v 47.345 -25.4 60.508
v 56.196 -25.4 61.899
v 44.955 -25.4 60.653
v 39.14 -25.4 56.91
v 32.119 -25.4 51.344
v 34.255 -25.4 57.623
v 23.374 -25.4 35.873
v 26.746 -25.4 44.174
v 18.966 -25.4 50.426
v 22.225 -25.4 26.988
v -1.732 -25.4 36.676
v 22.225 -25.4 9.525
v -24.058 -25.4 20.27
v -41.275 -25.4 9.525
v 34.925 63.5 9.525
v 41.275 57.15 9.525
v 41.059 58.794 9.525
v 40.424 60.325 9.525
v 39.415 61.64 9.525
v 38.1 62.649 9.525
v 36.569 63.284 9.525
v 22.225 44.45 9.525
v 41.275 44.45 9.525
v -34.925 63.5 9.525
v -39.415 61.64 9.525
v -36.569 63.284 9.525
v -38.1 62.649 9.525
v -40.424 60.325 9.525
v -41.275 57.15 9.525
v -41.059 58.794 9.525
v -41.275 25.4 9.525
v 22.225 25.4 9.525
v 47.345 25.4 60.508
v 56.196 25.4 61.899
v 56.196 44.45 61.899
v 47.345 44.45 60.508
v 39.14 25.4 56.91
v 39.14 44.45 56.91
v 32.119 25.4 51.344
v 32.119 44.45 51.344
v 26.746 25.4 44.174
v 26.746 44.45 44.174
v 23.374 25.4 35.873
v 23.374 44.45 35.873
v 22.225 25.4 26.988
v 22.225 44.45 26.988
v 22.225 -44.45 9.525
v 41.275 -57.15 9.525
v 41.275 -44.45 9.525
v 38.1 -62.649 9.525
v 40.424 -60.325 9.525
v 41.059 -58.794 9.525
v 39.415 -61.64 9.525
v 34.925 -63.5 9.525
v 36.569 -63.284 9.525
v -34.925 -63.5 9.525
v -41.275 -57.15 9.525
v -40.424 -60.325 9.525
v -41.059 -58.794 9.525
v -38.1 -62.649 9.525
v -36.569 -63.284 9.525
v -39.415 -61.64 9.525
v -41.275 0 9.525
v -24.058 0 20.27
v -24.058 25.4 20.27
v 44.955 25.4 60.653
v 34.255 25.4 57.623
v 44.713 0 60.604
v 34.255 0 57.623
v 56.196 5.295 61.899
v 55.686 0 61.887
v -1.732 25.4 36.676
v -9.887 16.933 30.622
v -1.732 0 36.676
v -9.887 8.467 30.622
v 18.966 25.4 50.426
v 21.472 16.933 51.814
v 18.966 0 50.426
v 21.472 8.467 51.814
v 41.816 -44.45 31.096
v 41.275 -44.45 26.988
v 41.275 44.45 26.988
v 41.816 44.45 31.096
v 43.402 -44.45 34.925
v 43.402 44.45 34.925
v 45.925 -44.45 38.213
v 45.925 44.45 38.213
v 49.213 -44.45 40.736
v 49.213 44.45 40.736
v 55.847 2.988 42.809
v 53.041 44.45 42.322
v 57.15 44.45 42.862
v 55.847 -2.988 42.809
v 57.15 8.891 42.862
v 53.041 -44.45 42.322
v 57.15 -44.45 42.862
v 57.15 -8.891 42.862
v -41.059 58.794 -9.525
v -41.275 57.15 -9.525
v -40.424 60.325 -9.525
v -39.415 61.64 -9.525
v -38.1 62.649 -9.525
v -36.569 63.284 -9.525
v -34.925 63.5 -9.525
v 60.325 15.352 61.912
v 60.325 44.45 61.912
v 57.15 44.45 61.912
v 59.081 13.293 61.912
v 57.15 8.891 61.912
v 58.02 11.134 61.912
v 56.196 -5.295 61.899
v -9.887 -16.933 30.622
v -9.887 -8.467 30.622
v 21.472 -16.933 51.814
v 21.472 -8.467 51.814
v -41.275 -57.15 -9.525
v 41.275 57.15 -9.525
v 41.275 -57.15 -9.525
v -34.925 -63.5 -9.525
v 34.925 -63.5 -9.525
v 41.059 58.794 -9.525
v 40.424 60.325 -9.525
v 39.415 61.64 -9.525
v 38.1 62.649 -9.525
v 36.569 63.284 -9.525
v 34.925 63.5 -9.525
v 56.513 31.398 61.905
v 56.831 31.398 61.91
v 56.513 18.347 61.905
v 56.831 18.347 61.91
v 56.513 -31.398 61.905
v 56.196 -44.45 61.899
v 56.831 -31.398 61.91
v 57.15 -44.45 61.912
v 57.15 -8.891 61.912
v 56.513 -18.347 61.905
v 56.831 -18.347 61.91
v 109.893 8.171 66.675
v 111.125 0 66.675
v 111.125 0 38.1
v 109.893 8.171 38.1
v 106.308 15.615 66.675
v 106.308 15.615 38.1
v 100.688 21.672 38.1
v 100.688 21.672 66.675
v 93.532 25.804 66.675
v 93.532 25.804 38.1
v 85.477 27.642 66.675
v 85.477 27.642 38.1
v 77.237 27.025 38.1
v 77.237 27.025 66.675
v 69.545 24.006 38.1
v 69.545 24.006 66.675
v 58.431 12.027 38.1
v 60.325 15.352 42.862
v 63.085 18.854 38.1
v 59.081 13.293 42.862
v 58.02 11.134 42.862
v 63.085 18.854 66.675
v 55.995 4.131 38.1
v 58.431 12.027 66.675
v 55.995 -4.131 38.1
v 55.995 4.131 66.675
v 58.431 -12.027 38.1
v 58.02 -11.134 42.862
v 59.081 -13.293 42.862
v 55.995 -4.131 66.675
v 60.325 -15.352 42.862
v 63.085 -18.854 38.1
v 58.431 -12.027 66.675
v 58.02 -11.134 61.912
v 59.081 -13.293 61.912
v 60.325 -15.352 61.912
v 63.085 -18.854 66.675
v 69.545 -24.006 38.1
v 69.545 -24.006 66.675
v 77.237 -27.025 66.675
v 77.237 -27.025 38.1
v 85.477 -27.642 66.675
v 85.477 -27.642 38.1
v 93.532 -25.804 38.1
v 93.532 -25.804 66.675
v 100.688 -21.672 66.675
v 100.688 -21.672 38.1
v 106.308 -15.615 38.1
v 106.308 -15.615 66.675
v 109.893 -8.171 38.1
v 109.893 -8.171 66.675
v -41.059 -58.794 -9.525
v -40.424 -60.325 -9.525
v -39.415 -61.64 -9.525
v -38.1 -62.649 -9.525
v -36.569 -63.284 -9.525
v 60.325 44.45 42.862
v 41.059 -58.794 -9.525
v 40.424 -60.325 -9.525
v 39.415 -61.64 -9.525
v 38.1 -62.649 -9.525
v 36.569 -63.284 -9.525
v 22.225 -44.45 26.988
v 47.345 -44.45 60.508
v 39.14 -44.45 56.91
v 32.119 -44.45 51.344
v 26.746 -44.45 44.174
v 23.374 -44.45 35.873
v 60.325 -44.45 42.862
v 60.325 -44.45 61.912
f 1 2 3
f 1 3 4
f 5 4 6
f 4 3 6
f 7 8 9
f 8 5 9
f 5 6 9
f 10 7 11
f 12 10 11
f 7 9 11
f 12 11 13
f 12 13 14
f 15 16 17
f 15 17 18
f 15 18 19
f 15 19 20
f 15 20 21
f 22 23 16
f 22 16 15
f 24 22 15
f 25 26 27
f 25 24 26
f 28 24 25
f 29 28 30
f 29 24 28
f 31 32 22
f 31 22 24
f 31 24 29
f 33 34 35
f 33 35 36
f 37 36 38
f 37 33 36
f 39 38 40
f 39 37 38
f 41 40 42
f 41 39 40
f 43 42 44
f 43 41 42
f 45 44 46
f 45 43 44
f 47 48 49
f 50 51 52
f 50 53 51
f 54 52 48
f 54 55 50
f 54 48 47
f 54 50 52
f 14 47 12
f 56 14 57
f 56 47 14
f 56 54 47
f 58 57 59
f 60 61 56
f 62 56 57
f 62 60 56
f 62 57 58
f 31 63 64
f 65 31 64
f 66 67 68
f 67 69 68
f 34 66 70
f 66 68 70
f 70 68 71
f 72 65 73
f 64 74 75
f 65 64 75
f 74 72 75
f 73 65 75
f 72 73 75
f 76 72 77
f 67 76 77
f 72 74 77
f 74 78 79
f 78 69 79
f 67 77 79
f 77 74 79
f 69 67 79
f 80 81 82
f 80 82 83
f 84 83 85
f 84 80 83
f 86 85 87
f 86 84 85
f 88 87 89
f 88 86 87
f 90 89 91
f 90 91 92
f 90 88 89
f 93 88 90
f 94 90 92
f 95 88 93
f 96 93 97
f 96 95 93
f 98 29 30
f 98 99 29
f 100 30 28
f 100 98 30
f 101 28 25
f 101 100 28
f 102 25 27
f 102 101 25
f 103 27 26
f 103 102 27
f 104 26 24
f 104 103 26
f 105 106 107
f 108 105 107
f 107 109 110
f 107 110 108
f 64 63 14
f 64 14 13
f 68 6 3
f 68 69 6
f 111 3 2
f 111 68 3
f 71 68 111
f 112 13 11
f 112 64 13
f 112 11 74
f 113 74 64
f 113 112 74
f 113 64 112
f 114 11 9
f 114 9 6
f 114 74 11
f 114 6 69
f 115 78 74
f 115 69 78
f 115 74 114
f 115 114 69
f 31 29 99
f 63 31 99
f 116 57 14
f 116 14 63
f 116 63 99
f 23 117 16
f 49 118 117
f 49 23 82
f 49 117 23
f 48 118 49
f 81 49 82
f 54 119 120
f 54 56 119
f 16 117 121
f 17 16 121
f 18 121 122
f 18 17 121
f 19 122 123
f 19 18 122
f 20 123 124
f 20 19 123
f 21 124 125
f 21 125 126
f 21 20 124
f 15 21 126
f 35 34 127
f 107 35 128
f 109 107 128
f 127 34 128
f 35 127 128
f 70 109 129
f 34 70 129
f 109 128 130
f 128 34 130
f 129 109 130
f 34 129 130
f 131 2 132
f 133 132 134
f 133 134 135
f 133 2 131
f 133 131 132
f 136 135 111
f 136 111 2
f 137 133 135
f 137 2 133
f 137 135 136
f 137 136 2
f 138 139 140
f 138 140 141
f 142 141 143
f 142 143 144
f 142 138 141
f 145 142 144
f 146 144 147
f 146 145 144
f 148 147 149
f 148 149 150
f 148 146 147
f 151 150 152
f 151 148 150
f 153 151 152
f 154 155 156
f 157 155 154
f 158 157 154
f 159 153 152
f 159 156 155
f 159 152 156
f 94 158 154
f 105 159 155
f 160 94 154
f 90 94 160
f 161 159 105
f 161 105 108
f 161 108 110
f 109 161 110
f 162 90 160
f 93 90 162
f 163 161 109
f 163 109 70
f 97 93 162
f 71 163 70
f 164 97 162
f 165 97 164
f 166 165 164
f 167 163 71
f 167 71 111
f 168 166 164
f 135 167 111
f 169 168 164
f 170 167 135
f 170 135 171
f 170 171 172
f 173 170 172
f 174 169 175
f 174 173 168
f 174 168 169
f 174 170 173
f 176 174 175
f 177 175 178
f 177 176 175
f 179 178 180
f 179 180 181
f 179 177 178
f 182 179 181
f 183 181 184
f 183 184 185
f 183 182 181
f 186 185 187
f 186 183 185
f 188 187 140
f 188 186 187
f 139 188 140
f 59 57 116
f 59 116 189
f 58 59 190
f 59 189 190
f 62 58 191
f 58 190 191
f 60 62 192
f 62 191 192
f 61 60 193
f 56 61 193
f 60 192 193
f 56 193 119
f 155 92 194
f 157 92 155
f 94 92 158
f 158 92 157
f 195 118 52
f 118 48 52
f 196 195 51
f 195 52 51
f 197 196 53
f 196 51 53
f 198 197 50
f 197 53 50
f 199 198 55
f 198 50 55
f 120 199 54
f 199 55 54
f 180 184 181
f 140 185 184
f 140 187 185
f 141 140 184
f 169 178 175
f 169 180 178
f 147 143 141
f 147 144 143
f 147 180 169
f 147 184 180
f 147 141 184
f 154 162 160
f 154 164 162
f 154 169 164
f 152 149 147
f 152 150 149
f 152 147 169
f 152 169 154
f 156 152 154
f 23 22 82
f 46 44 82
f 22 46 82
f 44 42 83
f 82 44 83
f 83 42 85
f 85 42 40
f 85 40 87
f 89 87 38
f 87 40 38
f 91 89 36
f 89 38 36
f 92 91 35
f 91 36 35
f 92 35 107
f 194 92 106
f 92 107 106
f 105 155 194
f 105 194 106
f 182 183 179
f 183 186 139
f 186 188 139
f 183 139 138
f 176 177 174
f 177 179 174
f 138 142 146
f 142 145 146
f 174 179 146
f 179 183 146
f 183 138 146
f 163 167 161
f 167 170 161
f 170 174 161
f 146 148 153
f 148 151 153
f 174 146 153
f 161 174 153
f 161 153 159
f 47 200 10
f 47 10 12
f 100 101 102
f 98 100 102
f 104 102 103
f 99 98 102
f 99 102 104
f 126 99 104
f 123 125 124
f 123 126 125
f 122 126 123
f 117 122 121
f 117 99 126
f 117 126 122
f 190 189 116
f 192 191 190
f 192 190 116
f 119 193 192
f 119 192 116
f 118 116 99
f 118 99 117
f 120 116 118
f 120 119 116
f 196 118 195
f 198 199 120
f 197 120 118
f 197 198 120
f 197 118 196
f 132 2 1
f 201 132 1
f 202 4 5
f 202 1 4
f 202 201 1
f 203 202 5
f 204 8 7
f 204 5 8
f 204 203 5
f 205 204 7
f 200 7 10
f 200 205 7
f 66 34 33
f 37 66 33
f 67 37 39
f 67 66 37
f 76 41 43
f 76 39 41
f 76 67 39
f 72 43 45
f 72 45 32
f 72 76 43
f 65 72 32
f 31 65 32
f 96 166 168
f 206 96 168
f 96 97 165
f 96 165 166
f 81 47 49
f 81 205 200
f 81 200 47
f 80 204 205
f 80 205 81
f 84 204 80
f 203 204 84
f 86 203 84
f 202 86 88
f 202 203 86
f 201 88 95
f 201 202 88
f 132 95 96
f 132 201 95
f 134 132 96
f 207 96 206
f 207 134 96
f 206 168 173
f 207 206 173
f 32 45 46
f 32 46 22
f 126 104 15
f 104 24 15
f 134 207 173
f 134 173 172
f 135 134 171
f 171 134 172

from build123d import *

# Parameters (mm, degrees)
F1_DEPTH = 63.5
F2_DEPTH = 25.4
F3_DEPTH = 44.45
F0_W     = 27.7197288275
F0_H     = 28.575
F5_R     = 6.35


with BuildPart() as f1:
    # F0 (on Front) → F1 (new body, symmetric)
    with BuildSketch(Plane.XZ):
        Polygon((-41.275, -9.525), (41.275, -9.525), (41.275, 9.525), (22.225, 9.525), (-41.275, 9.525), align=None)
    extrude(amount=F1_DEPTH, both=True)

    # F0 (on Front) → F2 (join, symmetric)
    with BuildSketch(Plane.XZ):
        with BuildLine():
            add(Edge.make_bspline(
                [(-41.275, 9.525), (-8.7416619248, 26.8411315561), (18.6592967194, 61.1014551348), (56.1959573796, 61.8994668263)],
                knots=[0, 0, 0, 0, 110.5640017612, 110.5640017612, 110.5640017612, 110.5640017612], degree=3))
            Line((-41.275, 9.525), (22.225, 9.525))
            Line((22.225, 9.525), (22.225, 26.9875))
            ThreePointArc((22.225, 26.9875), (32.1192632598, 51.3435637879), (56.1959573796, 61.8994668263))
        make_face()
    extrude(amount=F2_DEPTH, both=True)

    # F0 (on Front) → F3 (join, symmetric)
    with BuildSketch(Plane.XZ):
        with BuildLine():
            Line((22.225, 9.525), (41.275, 9.525))
            Line((41.275, 9.525), (41.275, 26.9875))
            ThreePointArc((41.275, 26.9875), (45.9246798487, 38.2128201513), (57.15, 42.8625))
            Line((57.15, 42.8625), (60.325, 42.8625))
            Line((60.325, 42.8625), (60.325, 61.9125))
            Line((60.325, 61.9125), (57.15, 61.9125))
            add(Edge.make_bspline(
                [(56.1959573796, 61.8994668263), (56.513244332, 61.9062121971), (56.8312554651, 61.9105667358), (57.15, 61.9125)],
                knots=[110.5640017612, 110.5640017612, 110.5640017612, 110.5640017612, 111.4985685166, 111.4985685166, 111.4985685166, 111.4985685166], degree=3))
            ThreePointArc((56.1959573796, 61.8994668263), (32.1192632598, 51.3435637879), (22.225, 26.9875))
            Line((22.225, 26.9875), (22.225, 9.525))
        make_face()
    extrude(amount=F3_DEPTH, both=True)

    # F0 (on Front) → F4 (revolve)
    with BuildSketch(Plane.XZ):
        with Locations((97.2651355863, 52.3875)):
            Rectangle(F0_W, F0_H)
    revolve(axis=Axis((83.4052711725, 0, 52.3875), (0, 0, 1)))

    # F5
    f5_edges = [f1.edges().sort_by_distance(p)[0] for p in [
        (41.275, -63.5, 0),
        (-41.275, -63.5, 0),
        (-41.275, 63.5, 0),
        (41.275, 63.5, 0),
    ]]
    fillet(f5_edges, radius=F5_R)


solid = f1.part
